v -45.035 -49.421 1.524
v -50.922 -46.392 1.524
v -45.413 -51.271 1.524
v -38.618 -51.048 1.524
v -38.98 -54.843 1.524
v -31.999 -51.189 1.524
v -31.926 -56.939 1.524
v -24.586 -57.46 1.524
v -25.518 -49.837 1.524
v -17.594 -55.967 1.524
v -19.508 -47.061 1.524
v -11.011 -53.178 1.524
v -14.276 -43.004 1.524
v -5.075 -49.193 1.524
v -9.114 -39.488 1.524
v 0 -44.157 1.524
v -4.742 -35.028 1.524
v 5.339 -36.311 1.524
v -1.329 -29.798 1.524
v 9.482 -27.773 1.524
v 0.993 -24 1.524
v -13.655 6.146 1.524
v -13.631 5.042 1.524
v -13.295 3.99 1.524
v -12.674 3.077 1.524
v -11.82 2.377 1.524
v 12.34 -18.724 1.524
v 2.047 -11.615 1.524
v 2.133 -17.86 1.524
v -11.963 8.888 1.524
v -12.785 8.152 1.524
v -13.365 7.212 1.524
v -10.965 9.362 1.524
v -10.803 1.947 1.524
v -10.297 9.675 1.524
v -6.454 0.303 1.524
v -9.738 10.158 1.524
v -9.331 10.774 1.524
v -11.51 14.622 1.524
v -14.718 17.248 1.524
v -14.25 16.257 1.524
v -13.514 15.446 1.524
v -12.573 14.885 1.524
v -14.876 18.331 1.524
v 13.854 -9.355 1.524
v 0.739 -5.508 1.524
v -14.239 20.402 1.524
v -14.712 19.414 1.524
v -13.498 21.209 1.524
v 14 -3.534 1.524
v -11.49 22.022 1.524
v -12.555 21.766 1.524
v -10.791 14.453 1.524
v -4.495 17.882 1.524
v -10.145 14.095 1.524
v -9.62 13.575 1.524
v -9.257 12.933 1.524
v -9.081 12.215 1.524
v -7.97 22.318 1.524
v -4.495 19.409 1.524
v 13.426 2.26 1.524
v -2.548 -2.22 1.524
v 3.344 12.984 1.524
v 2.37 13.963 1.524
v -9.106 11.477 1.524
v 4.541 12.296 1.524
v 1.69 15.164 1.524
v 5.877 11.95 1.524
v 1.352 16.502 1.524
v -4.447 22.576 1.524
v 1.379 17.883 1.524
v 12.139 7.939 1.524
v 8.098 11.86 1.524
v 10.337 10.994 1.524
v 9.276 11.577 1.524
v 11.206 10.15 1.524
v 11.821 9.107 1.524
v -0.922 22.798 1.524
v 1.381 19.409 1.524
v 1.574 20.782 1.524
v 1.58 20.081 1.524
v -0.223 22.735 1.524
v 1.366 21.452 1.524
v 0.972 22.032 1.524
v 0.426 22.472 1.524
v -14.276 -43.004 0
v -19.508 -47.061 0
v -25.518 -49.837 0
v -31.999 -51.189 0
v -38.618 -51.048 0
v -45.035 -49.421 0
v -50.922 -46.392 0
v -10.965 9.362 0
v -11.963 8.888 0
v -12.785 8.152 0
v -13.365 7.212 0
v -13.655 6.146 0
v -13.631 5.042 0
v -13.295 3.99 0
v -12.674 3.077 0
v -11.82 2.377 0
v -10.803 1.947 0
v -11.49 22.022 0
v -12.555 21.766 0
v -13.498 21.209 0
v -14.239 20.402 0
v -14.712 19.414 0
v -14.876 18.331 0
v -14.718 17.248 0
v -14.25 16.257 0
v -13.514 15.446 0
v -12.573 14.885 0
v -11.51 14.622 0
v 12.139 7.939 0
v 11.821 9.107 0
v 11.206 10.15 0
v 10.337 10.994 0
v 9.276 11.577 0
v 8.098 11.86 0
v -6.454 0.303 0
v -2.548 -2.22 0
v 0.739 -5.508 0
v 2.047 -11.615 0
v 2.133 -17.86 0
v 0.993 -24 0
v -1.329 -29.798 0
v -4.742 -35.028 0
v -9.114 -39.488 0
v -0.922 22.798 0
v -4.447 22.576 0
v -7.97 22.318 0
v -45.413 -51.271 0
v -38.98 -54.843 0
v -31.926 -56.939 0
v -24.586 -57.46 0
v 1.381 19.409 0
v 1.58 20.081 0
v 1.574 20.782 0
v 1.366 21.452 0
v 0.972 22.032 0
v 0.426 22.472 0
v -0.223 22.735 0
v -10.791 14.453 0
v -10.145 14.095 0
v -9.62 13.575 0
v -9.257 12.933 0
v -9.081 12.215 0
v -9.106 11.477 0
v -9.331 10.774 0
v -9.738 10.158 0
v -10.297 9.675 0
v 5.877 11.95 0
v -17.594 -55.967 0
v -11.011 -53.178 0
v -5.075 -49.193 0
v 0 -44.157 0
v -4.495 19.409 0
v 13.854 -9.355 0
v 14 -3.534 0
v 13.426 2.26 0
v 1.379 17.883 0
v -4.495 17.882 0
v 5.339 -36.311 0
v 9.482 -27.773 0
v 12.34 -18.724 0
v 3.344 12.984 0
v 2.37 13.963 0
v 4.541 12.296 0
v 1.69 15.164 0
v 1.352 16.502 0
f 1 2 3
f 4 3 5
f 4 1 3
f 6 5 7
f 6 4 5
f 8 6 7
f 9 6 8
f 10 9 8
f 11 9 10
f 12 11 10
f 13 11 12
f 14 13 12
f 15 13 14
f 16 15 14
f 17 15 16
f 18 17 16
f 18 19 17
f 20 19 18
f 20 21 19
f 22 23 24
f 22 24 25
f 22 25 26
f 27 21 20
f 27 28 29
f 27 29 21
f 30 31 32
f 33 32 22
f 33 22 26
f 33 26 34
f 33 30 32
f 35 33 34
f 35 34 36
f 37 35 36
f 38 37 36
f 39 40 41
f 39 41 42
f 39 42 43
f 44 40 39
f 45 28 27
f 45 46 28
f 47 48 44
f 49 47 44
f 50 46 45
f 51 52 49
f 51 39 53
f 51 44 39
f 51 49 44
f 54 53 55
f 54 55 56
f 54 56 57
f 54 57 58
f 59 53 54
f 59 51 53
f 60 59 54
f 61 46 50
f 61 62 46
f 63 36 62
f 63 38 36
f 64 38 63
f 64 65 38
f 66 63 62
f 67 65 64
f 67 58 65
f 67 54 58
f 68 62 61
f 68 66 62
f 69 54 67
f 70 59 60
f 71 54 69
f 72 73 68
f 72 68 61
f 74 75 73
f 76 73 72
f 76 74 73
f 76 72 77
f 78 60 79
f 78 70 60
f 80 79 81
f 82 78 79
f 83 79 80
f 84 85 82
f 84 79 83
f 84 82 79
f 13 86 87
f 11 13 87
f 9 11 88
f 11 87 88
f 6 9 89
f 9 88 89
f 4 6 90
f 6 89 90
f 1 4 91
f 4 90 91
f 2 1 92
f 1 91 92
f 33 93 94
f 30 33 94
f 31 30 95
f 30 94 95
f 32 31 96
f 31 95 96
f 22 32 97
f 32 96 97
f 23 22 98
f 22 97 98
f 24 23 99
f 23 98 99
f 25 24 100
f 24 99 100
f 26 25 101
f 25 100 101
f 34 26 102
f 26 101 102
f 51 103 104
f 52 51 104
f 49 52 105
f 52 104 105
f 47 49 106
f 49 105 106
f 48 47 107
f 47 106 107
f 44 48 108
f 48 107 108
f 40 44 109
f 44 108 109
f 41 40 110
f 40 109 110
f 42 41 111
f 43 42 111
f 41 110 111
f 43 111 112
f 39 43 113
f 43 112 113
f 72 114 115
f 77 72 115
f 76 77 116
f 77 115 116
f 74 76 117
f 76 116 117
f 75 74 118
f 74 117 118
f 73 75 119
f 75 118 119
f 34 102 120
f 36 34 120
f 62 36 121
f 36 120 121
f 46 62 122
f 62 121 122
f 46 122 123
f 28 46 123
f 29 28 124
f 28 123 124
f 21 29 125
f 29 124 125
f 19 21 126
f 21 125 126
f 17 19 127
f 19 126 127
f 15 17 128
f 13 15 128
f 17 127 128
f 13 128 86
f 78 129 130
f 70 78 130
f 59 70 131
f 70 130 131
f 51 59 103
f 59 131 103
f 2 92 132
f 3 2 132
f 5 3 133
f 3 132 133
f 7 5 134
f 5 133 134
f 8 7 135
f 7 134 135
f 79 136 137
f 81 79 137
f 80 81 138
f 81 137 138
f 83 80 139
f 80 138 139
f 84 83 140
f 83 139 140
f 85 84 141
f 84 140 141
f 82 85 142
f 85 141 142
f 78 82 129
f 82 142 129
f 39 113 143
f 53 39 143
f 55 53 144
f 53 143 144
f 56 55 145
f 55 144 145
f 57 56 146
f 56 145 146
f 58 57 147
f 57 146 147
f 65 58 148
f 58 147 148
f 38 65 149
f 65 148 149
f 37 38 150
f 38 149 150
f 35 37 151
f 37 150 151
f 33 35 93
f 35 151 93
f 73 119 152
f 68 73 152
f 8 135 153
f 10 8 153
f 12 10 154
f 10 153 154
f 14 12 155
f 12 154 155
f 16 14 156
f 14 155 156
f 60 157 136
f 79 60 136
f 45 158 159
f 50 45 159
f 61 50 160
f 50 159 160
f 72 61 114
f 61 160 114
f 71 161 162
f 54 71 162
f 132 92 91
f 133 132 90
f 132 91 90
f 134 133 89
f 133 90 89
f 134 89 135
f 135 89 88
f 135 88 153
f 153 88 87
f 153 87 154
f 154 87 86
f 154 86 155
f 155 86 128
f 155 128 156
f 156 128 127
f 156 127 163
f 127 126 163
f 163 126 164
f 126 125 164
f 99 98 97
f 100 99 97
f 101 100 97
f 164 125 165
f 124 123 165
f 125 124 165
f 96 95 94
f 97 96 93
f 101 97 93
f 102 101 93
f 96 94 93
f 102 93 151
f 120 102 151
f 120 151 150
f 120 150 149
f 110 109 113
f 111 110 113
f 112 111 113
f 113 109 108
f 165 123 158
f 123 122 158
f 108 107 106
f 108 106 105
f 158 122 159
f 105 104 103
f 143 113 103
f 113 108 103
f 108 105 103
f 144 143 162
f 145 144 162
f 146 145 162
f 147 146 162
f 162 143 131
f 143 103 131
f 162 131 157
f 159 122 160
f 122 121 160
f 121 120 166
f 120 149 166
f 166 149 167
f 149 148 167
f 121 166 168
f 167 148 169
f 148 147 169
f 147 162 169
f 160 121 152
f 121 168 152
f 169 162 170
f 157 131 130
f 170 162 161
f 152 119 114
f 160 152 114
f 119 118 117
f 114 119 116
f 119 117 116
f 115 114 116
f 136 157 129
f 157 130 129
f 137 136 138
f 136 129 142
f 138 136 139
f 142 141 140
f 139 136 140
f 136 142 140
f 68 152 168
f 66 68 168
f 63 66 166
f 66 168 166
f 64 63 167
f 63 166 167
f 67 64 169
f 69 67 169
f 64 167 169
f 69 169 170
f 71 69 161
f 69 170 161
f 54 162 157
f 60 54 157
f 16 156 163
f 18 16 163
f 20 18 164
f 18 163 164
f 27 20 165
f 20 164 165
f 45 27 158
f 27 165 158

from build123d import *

# Parameters (mm, degrees)
BOSS_EXTRUDE1_DEPTH = 1.524


with BuildPart() as part:
    # Sketch1 → Boss-Extrude1 (new body)
    with BuildSketch(Plane.XY):
        with BuildLine():
            Line((8.098483712, 11.859727981), (5.877367718, 11.949858026))
            ThreePointArc((5.877367718, 11.949858026), (2.370350057, 13.962618774), (1.378838723, 17.882731524))
            Line((1.378838723, 17.882731524), (-4.494535751, 17.881911563))
            Line((-4.494535751, 17.881911563), (-4.494535751, 19.408886177))
            Line((-4.494535751, 19.408886177), (1.380889641, 19.408886177))
            ThreePointArc((1.380889641, 19.408886177), (1.19021021, 21.756216477), (-0.921759528, 22.798282696))
            ThreePointArc((-0.921759528, 22.798282696), (-6.208886665, 22.451672785), (-11.489936734, 22.022298875))
            ThreePointArc((-11.489936734, 22.022298875), (-14.876191758, 18.331465892), (-11.509843158, 14.622467604))
            ThreePointArc((-11.509843158, 14.622467604), (-9.080668933, 12.21547028), (-10.965433597, 9.362018739))
            ThreePointArc((-10.965433597, 9.362018739), (-13.682519769, 5.593287076), (-10.802877432, 1.947254215))
            ThreePointArc((-10.802877432, 1.947254215), (-4.434214721, -0.855352195), (0.739102642, -5.50844309))
            ThreePointArc((0.739102642, -5.50844309), (-0.02520916, -26.956652298), (-14.27594324, -43.004282308))
            ThreePointArc((-14.27594324, -43.004282308), (-31.998801932, -51.188810857), (-50.921597015, -46.391514323))
            ThreePointArc((-50.921597015, -46.391514323), (-38.979769068, -54.843194408), (-24.585605901, -57.4597222))
            ThreePointArc((-24.585605901, -57.4597222), (-11.010595968, -53.177928069), (0, -44.156762285))
            ThreePointArc((0, -44.156762285), (9.481977012, -27.77313527), (13.853593601, -9.35520676))
            ThreePointArc((13.853593601, -9.35520676), (13.803097482, -0.628370713), (12.139120175, 7.938507176))
            ThreePointArc((12.139120175, 7.938507176), (10.799936026, 10.60099471), (8.098483712, 11.859727981))
        make_face()
    extrude(amount=BOSS_EXTRUDE1_DEPTH)


solid = part.part
